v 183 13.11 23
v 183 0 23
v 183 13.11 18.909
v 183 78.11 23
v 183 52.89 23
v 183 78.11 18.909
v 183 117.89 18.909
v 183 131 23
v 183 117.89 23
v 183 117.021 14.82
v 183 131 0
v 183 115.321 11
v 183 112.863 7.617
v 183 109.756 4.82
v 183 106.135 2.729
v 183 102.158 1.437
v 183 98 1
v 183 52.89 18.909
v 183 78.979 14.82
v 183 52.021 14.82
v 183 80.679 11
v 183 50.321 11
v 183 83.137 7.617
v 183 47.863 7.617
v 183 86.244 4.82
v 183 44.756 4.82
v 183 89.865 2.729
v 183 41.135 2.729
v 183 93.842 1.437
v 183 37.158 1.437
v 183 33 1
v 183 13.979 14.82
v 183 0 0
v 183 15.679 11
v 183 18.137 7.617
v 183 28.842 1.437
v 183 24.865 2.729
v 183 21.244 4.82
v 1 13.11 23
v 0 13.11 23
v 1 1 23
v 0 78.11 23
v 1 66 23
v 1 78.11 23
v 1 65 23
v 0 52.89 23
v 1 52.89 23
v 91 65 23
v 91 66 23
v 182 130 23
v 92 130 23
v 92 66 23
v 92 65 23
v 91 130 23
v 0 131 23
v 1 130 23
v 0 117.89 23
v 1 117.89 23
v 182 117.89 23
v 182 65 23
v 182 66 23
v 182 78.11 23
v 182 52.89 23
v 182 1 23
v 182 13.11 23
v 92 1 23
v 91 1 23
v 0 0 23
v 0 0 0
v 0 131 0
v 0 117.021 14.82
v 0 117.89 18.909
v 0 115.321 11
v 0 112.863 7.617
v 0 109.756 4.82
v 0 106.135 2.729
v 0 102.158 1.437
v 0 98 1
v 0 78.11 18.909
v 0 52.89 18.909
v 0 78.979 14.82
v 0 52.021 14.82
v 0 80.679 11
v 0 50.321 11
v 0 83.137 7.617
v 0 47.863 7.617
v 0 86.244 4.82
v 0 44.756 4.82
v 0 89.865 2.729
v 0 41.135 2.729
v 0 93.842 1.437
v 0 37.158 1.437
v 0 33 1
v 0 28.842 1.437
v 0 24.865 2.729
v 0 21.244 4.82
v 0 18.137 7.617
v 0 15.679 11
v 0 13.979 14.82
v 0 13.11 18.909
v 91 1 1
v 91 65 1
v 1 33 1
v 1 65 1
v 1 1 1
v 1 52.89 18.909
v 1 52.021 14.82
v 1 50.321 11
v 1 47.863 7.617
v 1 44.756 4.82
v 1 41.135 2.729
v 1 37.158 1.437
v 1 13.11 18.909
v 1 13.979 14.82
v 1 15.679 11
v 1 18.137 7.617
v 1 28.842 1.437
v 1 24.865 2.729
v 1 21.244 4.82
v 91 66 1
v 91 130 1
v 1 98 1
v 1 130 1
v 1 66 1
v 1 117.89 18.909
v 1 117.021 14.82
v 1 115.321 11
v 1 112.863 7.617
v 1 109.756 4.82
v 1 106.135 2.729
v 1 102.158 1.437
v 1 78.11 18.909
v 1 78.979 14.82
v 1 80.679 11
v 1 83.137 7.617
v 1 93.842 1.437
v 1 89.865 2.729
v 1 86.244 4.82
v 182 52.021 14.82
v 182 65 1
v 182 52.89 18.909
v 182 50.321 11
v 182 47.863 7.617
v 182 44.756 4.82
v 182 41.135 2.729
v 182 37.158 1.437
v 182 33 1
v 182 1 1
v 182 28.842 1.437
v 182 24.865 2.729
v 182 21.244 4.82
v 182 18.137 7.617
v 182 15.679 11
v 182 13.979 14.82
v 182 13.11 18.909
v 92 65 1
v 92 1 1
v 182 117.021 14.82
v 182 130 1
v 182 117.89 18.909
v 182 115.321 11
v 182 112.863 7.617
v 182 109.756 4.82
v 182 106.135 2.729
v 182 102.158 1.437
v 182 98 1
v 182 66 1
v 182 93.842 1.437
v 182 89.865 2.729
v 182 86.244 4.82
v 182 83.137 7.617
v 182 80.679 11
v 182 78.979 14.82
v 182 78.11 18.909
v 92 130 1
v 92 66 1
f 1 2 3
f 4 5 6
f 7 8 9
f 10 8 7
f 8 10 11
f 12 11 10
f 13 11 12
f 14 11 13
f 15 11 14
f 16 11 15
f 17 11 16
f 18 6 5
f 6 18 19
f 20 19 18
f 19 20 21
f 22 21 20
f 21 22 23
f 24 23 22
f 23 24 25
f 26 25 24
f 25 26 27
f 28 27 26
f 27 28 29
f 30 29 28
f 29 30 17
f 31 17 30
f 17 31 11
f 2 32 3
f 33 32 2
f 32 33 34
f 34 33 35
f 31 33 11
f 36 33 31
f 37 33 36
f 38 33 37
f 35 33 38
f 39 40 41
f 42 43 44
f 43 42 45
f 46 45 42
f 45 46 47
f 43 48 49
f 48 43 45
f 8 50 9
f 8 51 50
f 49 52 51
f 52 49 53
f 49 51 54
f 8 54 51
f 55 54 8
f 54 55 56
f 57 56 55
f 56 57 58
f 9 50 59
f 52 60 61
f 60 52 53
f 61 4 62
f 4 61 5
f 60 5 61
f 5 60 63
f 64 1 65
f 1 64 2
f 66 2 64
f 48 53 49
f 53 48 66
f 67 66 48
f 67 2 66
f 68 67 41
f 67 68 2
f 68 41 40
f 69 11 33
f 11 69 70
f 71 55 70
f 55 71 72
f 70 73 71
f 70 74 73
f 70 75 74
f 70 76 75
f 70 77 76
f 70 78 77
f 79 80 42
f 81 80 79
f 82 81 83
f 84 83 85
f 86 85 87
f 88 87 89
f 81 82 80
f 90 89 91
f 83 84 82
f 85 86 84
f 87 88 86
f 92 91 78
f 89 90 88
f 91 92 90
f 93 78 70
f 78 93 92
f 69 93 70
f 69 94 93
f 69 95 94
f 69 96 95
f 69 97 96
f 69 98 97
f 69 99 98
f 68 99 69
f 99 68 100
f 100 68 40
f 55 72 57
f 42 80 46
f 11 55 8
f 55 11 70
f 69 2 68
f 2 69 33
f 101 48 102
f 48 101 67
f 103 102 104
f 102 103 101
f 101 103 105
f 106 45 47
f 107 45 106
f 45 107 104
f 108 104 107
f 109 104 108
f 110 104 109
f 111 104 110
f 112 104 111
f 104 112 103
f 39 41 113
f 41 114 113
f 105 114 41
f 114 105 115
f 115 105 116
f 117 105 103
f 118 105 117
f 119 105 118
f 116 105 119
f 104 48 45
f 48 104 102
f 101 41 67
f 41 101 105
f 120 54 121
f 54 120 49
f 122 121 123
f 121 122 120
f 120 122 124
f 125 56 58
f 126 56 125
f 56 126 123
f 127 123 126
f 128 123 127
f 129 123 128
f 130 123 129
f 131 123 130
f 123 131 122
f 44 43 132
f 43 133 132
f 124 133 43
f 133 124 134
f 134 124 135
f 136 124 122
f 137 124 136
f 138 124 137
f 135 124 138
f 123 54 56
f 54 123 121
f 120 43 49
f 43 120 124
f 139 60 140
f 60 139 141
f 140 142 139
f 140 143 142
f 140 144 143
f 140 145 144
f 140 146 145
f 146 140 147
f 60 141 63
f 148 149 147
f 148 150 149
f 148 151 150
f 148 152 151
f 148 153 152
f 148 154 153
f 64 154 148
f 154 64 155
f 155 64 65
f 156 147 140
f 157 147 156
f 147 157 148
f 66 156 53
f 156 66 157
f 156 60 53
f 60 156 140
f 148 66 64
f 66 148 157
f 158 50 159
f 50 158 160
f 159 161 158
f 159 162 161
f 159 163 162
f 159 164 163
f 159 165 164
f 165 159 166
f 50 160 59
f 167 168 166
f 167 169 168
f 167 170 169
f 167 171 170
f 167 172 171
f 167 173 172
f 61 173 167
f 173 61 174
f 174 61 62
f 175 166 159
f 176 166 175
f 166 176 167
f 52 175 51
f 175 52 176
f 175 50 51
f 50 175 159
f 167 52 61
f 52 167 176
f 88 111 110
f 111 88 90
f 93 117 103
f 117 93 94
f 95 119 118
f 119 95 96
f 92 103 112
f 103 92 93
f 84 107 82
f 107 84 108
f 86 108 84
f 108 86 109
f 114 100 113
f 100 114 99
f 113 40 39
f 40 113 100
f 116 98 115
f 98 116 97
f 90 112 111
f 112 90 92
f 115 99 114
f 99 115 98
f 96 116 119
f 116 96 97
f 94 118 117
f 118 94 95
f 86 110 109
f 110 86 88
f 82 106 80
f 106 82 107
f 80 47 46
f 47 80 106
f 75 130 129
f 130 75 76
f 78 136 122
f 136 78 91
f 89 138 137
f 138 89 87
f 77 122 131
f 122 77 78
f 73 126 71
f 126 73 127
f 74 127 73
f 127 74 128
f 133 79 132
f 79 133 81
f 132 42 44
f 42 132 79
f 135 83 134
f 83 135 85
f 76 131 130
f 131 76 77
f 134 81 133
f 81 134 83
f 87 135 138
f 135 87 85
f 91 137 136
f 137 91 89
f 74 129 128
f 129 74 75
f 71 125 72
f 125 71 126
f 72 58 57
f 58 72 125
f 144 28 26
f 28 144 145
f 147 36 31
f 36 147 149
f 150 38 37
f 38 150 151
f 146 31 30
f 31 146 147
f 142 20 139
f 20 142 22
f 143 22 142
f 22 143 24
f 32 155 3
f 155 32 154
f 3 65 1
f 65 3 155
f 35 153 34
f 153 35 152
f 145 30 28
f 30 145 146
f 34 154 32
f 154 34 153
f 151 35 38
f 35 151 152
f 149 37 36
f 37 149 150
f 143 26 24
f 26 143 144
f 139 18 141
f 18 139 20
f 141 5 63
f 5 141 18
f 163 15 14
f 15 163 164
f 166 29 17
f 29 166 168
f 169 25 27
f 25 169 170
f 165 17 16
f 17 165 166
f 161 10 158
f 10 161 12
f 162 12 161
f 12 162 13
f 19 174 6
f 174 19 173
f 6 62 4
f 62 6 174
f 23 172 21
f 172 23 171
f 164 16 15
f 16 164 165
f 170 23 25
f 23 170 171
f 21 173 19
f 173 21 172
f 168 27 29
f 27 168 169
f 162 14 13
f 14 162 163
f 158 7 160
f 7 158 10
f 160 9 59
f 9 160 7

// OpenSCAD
// Fit four standard decks of 89x63mm cards and multiple token types.

difference() {
    cube([92+91,66+65,23]);
    translate([1,1,1]) cube([90,64,22]);
    translate([1,66,1]) cube([90,64,22]);
    translate([92,1,1]) cube([90,64,22]);
    translate([92,66,1]) cube([90,64,22]);
    translate([0,33,21]) rotate([0,90,0]) cylinder(r=20,h=5);
    translate([0,33+65,21]) rotate([0,90,0]) cylinder(r=20,h=5);
    translate([92+90,33,21]) rotate([0,90,0]) cylinder(r=20,h=5);
    translate([92+90,33+65,21]) rotate([0,90,0]) cylinder(r=20,h=5);

}
